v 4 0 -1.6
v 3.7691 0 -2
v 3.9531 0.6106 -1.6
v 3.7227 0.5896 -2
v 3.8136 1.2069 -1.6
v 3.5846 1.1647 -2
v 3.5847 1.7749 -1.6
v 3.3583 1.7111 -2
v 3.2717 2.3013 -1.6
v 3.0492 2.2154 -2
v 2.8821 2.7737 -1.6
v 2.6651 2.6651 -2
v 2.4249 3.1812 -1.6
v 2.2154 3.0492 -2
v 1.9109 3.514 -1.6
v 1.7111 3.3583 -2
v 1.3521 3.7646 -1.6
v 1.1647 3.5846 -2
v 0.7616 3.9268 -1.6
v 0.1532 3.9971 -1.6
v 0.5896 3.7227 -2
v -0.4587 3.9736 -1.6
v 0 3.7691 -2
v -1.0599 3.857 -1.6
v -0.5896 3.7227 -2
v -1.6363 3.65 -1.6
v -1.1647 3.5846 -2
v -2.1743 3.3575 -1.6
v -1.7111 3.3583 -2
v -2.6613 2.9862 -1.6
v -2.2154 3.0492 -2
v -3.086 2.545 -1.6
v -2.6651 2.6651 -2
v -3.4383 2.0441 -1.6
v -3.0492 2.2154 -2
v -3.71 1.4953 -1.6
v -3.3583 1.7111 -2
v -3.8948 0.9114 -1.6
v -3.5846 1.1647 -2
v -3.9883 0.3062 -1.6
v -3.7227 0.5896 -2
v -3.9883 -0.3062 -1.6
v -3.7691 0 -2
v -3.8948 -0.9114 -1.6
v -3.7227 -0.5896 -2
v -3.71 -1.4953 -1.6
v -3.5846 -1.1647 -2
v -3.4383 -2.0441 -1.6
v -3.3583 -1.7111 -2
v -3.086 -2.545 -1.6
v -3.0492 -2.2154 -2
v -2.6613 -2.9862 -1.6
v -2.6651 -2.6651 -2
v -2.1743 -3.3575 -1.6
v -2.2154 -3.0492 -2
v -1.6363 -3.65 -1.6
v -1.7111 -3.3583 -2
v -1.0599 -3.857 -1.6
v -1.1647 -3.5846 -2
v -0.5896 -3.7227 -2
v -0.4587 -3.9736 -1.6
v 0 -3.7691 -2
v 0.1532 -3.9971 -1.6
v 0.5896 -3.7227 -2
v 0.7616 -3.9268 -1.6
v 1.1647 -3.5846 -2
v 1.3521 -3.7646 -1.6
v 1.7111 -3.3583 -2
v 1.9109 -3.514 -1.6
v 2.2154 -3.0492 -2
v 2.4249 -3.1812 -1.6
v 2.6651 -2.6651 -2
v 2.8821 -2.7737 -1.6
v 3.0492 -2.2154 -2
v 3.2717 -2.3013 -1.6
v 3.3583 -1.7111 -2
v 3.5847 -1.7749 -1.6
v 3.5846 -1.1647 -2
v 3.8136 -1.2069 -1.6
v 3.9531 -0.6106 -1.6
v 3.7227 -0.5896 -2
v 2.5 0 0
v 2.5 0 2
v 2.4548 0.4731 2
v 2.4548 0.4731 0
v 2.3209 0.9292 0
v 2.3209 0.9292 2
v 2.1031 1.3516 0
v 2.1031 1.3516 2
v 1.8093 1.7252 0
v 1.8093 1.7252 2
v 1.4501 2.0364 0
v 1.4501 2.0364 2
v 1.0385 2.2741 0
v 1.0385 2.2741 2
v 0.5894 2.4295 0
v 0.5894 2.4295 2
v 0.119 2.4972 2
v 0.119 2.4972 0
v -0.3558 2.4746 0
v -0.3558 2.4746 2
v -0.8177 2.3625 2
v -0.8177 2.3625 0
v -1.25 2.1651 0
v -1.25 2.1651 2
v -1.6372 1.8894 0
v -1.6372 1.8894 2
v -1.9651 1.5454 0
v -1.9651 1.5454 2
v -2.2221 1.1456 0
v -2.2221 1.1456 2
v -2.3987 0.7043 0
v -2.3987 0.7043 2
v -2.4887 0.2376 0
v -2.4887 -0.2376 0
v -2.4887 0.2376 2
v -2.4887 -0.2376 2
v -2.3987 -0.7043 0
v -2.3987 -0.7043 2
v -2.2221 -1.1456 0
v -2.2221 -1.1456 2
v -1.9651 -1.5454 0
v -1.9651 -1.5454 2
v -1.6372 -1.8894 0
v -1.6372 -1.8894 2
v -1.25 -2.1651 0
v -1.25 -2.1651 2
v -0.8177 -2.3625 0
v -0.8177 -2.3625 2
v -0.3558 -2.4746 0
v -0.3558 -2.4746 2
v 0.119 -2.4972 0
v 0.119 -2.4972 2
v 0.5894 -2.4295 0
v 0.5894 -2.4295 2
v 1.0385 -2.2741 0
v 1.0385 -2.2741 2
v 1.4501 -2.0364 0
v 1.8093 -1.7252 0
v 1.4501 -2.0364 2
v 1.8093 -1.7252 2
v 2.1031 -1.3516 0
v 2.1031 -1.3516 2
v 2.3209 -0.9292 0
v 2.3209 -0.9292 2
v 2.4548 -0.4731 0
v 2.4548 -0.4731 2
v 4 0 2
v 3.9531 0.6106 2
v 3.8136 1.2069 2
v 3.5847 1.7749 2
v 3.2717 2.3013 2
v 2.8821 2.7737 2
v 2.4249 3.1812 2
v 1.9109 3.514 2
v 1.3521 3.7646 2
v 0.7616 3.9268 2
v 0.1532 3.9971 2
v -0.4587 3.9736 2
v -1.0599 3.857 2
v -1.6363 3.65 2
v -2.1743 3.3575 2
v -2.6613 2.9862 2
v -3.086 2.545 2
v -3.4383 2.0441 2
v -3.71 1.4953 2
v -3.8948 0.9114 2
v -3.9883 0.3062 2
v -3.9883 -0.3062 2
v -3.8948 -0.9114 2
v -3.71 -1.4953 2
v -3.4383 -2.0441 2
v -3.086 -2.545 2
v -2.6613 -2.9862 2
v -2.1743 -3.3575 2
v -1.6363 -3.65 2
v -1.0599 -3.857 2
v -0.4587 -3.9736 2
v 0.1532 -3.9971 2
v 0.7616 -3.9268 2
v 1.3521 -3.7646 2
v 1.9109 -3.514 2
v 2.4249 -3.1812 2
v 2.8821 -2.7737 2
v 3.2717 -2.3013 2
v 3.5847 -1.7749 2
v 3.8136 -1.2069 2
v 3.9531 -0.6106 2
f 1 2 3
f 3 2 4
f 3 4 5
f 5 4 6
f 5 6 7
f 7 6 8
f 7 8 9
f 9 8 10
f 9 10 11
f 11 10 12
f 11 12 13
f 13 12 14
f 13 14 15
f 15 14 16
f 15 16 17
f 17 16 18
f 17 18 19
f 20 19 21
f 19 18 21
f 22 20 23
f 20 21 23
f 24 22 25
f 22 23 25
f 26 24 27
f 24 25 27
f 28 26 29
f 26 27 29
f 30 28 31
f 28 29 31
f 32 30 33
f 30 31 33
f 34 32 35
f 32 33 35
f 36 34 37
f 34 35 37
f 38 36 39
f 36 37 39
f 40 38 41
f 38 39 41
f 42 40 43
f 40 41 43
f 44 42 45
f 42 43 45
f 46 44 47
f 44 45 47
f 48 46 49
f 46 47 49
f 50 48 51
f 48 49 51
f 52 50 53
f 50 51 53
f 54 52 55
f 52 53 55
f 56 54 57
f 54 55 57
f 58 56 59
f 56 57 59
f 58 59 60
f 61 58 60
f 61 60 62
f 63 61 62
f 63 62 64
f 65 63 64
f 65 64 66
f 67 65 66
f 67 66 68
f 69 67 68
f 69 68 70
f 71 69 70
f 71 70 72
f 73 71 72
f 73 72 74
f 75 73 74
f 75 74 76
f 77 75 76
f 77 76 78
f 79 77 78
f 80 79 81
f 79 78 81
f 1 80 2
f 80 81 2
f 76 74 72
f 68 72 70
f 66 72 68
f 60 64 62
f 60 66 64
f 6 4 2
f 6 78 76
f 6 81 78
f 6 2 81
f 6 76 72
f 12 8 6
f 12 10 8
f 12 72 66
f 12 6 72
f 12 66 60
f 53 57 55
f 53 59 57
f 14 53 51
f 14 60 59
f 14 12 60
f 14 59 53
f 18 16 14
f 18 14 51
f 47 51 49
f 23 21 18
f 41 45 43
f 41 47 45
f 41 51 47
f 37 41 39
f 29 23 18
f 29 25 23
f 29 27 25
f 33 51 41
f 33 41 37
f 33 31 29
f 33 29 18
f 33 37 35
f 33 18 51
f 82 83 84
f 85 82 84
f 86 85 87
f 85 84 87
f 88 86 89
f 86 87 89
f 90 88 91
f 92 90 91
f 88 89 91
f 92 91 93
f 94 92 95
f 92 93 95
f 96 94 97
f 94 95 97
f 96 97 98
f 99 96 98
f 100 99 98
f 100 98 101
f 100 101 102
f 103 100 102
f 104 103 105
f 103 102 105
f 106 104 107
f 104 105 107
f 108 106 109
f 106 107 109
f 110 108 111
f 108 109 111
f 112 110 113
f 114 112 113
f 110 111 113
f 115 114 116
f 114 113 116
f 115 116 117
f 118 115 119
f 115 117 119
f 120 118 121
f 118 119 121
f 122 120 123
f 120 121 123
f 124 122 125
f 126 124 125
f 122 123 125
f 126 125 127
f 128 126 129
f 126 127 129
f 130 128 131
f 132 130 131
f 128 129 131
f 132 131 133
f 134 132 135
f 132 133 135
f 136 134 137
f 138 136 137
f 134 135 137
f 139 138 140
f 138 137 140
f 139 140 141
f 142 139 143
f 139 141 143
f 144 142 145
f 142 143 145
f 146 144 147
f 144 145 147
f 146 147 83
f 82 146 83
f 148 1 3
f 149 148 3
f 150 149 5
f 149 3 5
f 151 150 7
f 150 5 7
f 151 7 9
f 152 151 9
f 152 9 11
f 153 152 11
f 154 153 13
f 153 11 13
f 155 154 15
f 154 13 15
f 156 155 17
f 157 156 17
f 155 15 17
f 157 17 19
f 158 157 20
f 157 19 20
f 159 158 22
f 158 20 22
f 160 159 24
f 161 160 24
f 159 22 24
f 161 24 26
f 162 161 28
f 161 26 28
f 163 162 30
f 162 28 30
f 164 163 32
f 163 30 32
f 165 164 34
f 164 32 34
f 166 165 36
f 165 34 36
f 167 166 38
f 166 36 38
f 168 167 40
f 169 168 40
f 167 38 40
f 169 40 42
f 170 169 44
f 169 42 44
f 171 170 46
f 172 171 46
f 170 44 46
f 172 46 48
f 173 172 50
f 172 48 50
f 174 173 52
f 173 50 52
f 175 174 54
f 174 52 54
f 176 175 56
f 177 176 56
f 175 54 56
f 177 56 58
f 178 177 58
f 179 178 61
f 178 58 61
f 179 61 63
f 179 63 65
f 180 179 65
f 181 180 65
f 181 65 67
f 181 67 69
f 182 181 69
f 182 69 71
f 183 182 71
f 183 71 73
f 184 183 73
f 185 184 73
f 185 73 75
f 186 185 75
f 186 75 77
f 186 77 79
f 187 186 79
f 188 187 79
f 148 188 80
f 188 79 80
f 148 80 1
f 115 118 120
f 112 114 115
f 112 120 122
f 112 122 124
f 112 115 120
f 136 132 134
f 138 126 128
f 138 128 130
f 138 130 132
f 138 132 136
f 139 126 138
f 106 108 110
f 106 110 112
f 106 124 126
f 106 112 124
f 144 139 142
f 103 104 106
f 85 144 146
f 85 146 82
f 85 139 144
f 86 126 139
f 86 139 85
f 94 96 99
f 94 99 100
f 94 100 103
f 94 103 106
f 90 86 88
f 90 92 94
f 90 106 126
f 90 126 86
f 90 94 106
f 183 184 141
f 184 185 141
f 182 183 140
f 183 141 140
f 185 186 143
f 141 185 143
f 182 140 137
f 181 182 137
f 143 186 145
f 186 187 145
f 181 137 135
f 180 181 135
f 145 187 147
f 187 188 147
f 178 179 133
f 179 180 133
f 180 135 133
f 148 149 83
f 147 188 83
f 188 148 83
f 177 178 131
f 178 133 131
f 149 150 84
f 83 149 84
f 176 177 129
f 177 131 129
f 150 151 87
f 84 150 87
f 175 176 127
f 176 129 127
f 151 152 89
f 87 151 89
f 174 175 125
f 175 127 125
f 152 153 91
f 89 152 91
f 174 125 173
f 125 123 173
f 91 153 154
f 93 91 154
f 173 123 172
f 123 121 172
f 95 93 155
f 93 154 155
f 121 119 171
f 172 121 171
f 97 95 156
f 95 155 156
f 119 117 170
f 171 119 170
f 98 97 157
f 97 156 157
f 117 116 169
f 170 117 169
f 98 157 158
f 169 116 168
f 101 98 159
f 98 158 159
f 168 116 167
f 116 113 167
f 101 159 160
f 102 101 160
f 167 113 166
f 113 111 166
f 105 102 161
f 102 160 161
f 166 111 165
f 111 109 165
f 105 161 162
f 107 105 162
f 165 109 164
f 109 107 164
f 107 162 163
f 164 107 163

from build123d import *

# Parameters (mm, degrees)
SKETCH1_W          = 4
SKETCH1_H          = 4
CHAMFER1_SIZE      = 0.4
CHAMFER1_SIZE2     = 0.230940108
SKETCH2_R          = 2.5
CUT_EXTRUDE1_DEPTH = 2


with BuildPart() as part:
    # Sketch1 → Revolve1 (revolve)
    with BuildSketch(Plane(origin=(0, 0, 0), x_dir=(1, 0, 0), z_dir=(0, 1, 0))):
        with Locations((2, 0)):
            Rectangle(SKETCH1_W, SKETCH1_H)
    revolve(axis=Axis((0, 0, -141.429107981), (0, 0, 1)))

    # Chamfer1
    chamfer1_edges = [part.edges().sort_by_distance(p)[0] for p in [
        (-4, 0, -2),
    ]]
    chamfer1_side = [part.faces().sort_by_distance(p)[0] for p in [
        (-4, 0, 0),
    ]]
    chamfer(chamfer1_edges, length=CHAMFER1_SIZE, length2=CHAMFER1_SIZE2, reference=chamfer1_side[0])

    # Sketch2 → Cut-Extrude1 (cut)
    with BuildSketch(Plane.XY.offset(2)):
        Circle(SKETCH2_R)
    extrude(amount=-CUT_EXTRUDE1_DEPTH, mode=Mode.SUBTRACT)


solid = part.part
